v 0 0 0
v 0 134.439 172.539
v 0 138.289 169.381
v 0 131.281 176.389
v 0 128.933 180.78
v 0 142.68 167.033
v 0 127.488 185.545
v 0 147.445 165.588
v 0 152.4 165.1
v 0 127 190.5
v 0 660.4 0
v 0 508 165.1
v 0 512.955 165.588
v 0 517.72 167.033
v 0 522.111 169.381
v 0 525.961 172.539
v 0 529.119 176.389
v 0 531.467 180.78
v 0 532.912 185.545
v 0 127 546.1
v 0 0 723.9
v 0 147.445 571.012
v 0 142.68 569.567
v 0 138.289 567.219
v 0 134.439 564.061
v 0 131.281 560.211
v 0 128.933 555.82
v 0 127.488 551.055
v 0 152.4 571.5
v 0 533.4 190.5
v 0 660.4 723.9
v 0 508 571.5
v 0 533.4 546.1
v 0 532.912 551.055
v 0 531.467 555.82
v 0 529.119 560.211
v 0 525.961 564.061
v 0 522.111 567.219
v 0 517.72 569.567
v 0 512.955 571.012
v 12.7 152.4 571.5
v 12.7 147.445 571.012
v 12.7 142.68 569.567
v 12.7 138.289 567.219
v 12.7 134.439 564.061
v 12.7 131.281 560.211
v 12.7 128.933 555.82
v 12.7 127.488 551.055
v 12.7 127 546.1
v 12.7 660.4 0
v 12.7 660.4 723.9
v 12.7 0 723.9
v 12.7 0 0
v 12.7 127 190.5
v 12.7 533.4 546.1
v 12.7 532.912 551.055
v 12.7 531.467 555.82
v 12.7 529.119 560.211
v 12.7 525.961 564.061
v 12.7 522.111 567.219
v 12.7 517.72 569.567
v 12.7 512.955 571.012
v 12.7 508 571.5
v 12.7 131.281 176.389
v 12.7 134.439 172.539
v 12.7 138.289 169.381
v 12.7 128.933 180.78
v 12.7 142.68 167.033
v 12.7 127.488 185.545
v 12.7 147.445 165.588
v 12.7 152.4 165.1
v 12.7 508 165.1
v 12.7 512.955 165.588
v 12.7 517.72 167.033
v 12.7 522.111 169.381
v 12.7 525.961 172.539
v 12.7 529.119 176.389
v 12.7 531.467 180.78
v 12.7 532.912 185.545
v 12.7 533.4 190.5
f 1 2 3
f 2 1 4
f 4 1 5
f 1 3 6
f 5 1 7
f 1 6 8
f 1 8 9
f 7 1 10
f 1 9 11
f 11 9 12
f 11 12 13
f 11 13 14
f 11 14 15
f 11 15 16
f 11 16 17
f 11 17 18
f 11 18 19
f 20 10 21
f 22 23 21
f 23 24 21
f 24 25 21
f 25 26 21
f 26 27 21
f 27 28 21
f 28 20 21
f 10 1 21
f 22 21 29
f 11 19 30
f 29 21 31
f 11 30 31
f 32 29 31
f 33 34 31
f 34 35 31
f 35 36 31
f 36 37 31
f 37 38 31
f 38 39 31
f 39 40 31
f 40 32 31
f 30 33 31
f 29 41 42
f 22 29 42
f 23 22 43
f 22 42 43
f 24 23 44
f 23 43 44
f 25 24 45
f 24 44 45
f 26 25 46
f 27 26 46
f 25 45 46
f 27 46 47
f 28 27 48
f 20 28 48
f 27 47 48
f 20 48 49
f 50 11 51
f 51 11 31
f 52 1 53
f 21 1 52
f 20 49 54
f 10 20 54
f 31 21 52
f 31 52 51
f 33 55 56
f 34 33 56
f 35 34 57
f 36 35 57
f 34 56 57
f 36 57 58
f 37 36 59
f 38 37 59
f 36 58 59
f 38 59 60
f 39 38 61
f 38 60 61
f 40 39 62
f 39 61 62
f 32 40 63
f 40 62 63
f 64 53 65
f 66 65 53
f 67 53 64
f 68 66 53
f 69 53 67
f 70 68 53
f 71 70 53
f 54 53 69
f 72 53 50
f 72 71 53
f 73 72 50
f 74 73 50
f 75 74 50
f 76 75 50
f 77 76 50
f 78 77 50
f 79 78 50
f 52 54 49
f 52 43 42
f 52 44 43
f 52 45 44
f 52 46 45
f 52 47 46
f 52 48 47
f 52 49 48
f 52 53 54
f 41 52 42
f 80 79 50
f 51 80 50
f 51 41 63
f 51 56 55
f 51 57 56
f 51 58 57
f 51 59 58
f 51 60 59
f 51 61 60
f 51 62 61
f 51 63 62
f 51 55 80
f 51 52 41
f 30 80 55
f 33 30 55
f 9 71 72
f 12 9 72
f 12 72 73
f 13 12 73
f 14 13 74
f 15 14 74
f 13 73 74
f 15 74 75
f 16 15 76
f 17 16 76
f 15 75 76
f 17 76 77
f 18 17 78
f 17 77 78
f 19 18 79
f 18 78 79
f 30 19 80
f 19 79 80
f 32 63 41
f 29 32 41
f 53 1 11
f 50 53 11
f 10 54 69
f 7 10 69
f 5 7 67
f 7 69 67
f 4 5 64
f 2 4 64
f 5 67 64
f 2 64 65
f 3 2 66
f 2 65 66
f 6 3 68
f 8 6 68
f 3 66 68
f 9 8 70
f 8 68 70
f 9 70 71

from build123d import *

# Parameters (mm, degrees)
F0_W     = 660.4
F0_H     = 723.9
F1_DEPTH = 12.7
F3_DEPTH = 12.701


with BuildPart() as f1:
    # F0 (on Right) → F1 (new body)
    with BuildSketch(Plane.YZ):
        with Locations((330.2, 361.95)):
            Rectangle(F0_W, F0_H)
    extrude(amount=F1_DEPTH)

    # F2 (on face) → F3 (cut, through all)
    with BuildSketch(Plane.YZ.offset(12.7)):
        with BuildLine():
            Line((508, 571.5), (152.4, 571.5))
            ThreePointArc((152.4, 571.5), (134.439488, 564.060512), (127, 546.1))
            Line((127, 546.1), (127, 190.5))
            ThreePointArc((127, 190.5), (134.439488, 172.539488), (152.4, 165.1))
            Line((152.4, 165.1), (508, 165.1))
            ThreePointArc((508, 165.1), (525.960512, 172.539488), (533.4, 190.5))
            Line((533.4, 190.5), (533.4, 546.1))
            ThreePointArc((533.4, 546.1), (525.960512, 564.060512), (508, 571.5))
        make_face()
    extrude(amount=-F3_DEPTH, mode=Mode.SUBTRACT)


solid = f1.part
